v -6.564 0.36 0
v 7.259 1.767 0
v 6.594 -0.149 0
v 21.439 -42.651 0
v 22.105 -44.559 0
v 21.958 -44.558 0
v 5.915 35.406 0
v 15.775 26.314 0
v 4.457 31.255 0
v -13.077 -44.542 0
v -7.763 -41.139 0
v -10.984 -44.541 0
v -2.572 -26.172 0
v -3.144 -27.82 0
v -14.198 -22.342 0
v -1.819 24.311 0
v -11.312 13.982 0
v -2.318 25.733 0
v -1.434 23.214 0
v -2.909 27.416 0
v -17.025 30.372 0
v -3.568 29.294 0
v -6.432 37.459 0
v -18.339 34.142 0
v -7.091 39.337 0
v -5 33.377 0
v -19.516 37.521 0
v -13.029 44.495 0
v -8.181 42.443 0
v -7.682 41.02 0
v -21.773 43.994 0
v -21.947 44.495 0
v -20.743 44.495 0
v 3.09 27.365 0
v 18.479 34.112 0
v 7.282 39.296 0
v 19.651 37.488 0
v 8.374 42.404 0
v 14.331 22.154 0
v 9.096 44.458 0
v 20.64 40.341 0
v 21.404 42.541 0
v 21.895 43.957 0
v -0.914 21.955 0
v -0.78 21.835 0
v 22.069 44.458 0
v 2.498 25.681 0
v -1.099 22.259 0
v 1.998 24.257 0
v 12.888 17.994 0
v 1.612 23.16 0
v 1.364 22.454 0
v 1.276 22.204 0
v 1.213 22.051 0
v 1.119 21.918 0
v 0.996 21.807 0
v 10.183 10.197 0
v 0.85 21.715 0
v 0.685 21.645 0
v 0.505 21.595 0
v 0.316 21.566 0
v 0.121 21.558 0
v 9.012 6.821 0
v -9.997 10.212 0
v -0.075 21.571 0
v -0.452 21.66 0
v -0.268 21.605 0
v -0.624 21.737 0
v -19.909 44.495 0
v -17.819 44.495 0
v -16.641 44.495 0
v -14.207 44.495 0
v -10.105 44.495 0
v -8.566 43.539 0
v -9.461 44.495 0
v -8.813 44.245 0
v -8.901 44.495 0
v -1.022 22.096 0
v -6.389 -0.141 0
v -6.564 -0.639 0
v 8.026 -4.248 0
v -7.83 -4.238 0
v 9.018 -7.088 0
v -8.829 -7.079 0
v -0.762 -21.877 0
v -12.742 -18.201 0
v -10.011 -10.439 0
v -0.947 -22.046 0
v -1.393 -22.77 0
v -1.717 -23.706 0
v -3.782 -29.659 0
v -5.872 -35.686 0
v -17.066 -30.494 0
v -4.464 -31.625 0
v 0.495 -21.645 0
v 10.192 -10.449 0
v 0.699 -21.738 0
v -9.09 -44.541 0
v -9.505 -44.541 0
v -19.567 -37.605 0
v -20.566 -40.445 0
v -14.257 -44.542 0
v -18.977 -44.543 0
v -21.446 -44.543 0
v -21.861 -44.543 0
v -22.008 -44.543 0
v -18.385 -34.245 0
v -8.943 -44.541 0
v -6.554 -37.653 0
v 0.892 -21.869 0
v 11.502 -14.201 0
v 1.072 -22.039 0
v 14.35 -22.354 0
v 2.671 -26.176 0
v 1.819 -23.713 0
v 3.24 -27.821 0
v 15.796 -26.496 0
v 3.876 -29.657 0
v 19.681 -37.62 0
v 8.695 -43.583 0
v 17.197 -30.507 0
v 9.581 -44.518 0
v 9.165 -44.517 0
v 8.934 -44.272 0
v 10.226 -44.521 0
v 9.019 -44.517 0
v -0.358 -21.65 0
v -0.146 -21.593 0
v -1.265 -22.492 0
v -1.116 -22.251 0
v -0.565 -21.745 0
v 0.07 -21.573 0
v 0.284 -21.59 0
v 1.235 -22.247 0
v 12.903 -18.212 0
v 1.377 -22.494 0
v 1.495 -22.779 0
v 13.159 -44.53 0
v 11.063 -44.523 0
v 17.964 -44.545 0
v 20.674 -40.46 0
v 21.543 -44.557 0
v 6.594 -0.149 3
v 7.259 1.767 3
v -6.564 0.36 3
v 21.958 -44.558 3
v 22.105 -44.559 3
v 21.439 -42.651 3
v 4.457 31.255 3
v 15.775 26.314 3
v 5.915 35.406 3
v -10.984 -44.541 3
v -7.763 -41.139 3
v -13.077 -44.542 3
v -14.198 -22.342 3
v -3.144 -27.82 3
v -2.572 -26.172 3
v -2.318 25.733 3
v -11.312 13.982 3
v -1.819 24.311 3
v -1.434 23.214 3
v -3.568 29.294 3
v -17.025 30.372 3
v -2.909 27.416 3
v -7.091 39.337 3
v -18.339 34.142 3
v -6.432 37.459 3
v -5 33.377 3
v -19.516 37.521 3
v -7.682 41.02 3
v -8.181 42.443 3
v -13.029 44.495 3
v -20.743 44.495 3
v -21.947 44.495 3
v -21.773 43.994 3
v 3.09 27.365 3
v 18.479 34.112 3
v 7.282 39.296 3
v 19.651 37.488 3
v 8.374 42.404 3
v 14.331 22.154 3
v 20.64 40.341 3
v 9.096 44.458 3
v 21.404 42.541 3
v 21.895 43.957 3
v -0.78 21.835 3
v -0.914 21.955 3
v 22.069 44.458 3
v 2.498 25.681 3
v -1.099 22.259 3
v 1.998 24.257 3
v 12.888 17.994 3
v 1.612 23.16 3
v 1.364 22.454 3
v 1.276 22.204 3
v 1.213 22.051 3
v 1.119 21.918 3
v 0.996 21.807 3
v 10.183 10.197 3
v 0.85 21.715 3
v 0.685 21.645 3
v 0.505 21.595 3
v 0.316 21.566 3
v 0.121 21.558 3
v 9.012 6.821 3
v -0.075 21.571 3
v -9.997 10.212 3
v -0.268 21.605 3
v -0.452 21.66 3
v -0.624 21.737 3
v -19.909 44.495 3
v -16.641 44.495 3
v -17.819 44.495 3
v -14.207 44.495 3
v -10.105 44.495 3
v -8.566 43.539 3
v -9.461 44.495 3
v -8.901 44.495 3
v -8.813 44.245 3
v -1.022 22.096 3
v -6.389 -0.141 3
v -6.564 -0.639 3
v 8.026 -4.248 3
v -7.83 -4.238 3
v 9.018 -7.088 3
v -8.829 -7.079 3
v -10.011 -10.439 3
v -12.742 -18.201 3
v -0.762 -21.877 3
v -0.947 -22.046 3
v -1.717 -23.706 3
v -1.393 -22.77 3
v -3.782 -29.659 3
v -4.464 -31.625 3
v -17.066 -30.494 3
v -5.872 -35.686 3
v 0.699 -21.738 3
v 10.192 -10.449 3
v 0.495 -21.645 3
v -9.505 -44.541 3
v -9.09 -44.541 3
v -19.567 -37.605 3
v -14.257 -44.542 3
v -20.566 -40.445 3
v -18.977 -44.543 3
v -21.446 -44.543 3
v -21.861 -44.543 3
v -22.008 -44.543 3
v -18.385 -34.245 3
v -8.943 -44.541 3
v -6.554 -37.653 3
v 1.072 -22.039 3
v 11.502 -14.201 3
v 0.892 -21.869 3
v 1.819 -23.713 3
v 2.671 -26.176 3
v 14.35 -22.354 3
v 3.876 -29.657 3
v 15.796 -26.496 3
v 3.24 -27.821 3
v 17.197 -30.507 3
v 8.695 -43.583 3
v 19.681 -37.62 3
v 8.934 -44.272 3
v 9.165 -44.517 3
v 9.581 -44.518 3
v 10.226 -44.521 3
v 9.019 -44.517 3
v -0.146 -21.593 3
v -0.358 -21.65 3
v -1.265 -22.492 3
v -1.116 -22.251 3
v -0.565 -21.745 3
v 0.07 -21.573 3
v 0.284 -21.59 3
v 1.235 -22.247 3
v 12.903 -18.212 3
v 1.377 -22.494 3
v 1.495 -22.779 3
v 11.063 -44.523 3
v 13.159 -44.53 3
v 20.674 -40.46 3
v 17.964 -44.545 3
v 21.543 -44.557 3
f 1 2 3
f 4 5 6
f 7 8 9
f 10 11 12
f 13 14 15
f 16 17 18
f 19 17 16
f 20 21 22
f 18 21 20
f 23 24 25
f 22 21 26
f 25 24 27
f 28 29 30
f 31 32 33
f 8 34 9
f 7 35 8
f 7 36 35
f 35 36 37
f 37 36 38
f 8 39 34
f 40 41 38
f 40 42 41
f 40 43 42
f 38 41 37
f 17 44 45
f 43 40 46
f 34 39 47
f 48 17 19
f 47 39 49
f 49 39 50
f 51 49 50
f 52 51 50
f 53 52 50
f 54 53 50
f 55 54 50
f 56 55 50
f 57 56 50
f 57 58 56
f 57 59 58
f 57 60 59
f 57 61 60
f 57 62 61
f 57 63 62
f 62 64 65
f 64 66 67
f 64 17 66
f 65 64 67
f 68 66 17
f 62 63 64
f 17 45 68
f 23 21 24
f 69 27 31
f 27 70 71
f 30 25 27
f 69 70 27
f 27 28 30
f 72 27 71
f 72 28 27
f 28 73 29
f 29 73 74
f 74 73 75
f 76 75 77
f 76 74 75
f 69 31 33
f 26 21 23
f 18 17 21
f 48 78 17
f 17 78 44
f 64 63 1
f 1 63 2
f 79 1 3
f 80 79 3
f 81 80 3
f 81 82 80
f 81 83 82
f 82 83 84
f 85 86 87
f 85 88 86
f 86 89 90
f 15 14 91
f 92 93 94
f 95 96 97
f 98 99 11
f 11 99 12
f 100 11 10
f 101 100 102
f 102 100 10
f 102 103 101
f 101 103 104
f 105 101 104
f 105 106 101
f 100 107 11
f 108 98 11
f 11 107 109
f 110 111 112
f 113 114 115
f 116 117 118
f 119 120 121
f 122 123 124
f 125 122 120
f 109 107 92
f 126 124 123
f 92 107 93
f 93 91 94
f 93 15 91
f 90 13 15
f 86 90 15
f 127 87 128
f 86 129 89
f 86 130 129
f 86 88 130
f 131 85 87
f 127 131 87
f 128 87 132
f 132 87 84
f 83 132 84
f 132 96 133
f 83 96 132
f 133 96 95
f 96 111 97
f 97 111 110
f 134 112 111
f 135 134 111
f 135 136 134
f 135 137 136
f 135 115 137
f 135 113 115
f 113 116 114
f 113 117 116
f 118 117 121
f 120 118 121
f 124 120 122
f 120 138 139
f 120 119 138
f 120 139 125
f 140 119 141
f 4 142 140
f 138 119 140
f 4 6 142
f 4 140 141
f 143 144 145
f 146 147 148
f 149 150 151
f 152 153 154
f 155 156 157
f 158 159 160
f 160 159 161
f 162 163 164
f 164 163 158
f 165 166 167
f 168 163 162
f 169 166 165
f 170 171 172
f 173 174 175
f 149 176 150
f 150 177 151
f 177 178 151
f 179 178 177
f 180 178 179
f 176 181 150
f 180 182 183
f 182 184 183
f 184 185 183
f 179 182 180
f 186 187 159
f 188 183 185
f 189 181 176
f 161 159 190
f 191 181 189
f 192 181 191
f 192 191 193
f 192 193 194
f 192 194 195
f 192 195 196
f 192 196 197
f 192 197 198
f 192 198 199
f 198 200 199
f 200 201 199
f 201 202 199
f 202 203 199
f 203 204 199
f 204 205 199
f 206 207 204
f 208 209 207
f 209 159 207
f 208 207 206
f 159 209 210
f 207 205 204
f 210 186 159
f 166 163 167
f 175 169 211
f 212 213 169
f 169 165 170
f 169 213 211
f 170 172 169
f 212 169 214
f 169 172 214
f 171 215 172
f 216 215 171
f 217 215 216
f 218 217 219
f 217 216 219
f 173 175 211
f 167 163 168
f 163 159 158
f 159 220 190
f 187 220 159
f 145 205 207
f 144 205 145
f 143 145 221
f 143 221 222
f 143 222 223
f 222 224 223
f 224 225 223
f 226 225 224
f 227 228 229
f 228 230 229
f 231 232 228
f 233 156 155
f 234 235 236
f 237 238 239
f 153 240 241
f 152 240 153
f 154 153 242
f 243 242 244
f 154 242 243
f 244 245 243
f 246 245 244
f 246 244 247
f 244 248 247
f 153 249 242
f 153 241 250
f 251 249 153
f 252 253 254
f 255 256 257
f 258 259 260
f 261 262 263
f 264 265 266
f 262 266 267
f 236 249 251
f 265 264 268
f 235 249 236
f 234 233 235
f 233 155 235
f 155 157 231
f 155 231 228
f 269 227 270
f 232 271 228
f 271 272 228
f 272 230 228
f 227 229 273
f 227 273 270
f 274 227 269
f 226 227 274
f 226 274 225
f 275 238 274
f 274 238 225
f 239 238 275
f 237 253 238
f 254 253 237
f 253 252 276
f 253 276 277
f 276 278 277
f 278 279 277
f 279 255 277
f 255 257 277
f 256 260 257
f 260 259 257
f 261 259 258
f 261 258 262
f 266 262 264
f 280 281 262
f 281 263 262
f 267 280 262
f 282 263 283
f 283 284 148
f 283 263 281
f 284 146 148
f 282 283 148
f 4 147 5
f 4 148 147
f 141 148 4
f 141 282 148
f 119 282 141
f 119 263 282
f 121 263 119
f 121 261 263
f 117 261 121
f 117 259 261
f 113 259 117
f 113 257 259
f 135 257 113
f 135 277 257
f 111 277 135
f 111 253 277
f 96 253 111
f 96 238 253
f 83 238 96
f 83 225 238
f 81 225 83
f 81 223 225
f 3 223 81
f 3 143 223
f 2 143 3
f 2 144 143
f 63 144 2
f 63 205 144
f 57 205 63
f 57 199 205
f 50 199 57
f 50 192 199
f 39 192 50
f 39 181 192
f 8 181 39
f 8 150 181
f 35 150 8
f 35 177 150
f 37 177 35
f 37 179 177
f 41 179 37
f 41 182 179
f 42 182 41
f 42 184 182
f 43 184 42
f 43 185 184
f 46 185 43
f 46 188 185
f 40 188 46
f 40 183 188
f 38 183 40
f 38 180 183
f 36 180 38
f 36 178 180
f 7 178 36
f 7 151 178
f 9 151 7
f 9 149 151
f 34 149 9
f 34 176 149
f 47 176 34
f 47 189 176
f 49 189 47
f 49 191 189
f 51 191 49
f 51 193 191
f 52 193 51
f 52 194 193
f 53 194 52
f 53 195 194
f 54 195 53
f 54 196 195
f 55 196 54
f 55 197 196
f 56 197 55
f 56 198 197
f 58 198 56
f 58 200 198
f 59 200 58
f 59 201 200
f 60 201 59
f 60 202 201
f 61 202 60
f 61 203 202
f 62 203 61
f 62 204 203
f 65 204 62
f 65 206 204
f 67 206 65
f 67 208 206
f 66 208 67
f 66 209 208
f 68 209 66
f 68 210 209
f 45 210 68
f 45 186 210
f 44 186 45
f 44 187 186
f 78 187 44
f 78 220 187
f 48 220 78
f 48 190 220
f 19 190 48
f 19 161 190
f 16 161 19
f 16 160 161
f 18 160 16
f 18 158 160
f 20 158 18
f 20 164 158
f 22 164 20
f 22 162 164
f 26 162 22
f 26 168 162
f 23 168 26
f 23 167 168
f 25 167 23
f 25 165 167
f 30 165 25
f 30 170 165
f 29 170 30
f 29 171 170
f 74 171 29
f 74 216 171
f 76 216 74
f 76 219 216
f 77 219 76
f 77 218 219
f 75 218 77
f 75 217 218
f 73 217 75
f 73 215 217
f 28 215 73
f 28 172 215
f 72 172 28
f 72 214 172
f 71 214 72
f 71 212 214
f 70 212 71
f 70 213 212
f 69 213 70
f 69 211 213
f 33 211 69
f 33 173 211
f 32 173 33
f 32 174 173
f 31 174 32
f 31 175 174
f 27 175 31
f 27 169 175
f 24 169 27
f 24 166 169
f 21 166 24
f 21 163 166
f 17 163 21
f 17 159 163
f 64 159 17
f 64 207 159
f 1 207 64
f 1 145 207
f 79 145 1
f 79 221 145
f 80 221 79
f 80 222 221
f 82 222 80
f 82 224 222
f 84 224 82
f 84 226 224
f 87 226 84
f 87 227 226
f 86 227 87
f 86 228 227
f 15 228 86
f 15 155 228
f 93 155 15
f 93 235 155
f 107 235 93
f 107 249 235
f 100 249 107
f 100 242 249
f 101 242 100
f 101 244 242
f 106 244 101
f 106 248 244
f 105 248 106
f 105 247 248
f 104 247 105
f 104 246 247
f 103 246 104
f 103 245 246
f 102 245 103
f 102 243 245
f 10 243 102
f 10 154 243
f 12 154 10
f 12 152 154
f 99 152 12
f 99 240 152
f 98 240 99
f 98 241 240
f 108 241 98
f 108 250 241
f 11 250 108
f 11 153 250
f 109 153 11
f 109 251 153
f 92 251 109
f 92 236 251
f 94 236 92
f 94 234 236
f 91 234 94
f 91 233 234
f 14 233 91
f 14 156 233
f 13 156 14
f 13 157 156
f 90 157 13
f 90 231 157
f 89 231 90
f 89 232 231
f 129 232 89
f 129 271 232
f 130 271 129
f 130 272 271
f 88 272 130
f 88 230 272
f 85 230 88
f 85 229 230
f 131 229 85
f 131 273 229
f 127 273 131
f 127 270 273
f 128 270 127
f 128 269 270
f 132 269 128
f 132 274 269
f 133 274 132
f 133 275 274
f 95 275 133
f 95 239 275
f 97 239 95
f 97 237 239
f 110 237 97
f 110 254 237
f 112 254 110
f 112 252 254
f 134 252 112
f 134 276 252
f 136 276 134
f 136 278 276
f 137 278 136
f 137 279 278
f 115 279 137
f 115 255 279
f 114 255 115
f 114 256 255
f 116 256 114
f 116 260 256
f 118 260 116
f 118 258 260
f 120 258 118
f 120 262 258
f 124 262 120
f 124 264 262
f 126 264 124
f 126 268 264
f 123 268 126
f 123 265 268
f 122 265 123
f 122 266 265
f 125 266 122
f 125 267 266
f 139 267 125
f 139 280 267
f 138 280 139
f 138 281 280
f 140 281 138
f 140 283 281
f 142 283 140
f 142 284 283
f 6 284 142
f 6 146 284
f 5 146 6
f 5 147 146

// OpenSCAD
// Generated from 交通部公路局（原交通部公路總局）「新式號牌使用之英文字、數字字體」author trace
fudge = 0.1;

module glyph_2012_X(h = 3) {
  difference() {
    linear_extrude(height = h)
      polygon(points = [[-21.9474, 44.495], [-21.7727, 43.9937], [-21.2789, 42.577], [-20.5116, 40.3758], [-19.5164, 37.5207], [-18.3389, 34.1425], [-17.0246, 30.372], [-15.6192, 26.3399], [-14.1682, 22.1771], [-12.7172, 18.0143], [-11.3118, 13.9823], [-9.9975, 10.2118], [-8.82, 6.8336], [-7.8248, 3.9785], [-7.0575, 1.7772], [-6.5637, 0.3605], [-6.3889, -0.1408], [-6.5644, -0.6394], [-7.0601, -2.0487], [-7.8303, -4.2384], [-8.8294, -7.0786], [-10.0114, -10.4392], [-11.3308, -14.19], [-12.7417, -18.2009], [-14.1983, -22.342], [-15.6549, -26.483], [-17.0658, -30.494], [-18.3851, -34.2448], [-19.5672, -37.6053], [-20.5662, -40.4455], [-21.3365, -42.6353], [-21.8322, -44.0446], [-22.0076, -44.5432], [-21.8609, -44.5432], [-21.4462, -44.5431], [-20.802, -44.543], [-19.9663, -44.5429], [-18.9775, -44.5428], [-17.874, -44.5426], [-16.6938, -44.5424], [-15.4754, -44.5422], [-14.257, -44.542], [-13.0769, -44.5419], [-11.9733, -44.5417], [-10.9845, -44.5415], [-10.1489, -44.5414], [-9.5046, -44.5413], [-9.0899, -44.5413], [-8.9432, -44.5412], [-8.8584, -44.2967], [-8.6188, -43.6058], [-8.2464, -42.5321], [-7.7634, -41.1395], [-7.192, -39.4918], [-6.5542, -37.6527], [-5.8721, -35.6861], [-5.1679, -33.6557], [-4.4637, -31.6253], [-3.7817, -29.6587], [-3.1438, -27.8196], [-2.5724, -26.1719], [-2.0894, -24.7793], [-1.717, -23.7057], [-1.4774, -23.0147], [-1.3926, -22.7702], [-1.2655, -22.4924], [-1.1159, -22.2508], [-0.9471, -22.0456], [-0.7623, -21.877], [-0.565, -21.7453], [-0.3584, -21.6505], [-0.1457, -21.5929], [0.0697, -21.5726], [0.2845, -21.59], [0.4954, -21.6451], [0.6992, -21.7381], [0.8925, -21.8693], [1.0721, -22.0388], [1.2346, -22.2468], [1.3768, -22.4936], [1.4953, -22.7792], [1.5798, -23.0233], [1.8186, -23.7132], [2.1896, -24.7852], [2.6708, -26.1757], [3.2402, -27.8208], [3.8757, -29.6571], [4.5553, -31.6207], [5.2569, -33.6479], [5.9586, -35.6752], [6.6382, -37.6388], [7.2737, -39.475], [7.8431, -41.1202], [8.3243, -42.5106], [8.6953, -43.5826], [8.9341, -44.2725], [9.0186, -44.5167], [9.1655, -44.5171], [9.5809, -44.5185], [10.2263, -44.5206], [11.0633, -44.5232], [12.0538, -44.5264], [13.1592, -44.53], [14.3414, -44.5338], [15.5618, -44.5377], [16.7823, -44.5416], [17.9644, -44.5454], [19.0699, -44.549], [20.0603, -44.5522], [20.8974, -44.5549], [21.5428, -44.557], [21.9581, -44.5583], [22.1051, -44.5588], [21.9309, -44.06], [21.4386, -42.6506], [20.6737, -40.4604], [19.6815, -37.6198], [18.5076, -34.2587], [17.1974, -30.5073], [15.7962, -26.4957], [14.3497, -22.354], [12.9031, -18.2123], [11.502, -14.2007], [10.1917, -10.4494], [9.0178, -7.0883], [8.0257, -4.2476], [7.2607, -2.0575], [6.7684, -0.648], [6.5942, -0.1493], [6.768, 0.3517], [7.2592, 1.7674], [8.0223, 3.9673], [9.0121, 6.8206], [10.1833, 10.1966], [11.4904, 13.9647], [12.8882, 17.9942], [14.3314, 22.1544], [15.7746, 26.3145], [17.1724, 30.344], [18.4795, 34.1121], [19.6507, 37.4881], [20.6405, 40.3414], [21.4037, 42.5413], [21.8948, 43.9571], [22.0686, 44.458], [21.9229, 44.458], [21.5112, 44.458], [20.8714, 44.458], [20.0416, 44.458], [19.0598, 44.458], [17.964, 44.458], [16.7922, 44.458], [15.5823, 44.458], [14.3725, 44.458], [13.2007, 44.458], [12.1048, 44.458], [11.123, 44.458], [10.2932, 44.458], [9.6535, 44.458], [9.2418, 44.458], [9.0961, 44.458], [9.0083, 44.2081], [8.7601, 43.5018], [8.3744, 42.4043], [7.8742, 40.9808], [7.2824, 39.2965], [6.6218, 37.4166], [5.9154, 35.4064], [5.1861, 33.3309], [4.4568, 31.2554], [3.7504, 29.2452], [3.0898, 27.3653], [2.4979, 25.681], [1.9977, 24.2575], [1.6121, 23.16], [1.3639, 22.4537], [1.276, 22.2038], [1.2135, 22.051], [1.1186, 21.9185], [0.9959, 21.8066], [0.8497, 21.7153], [0.6846, 21.6447], [0.5051, 21.5949], [0.3156, 21.5659], [0.1207, 21.5579], [-0.0753, 21.5709], [-0.2678, 21.6051], [-0.4524, 21.6604], [-0.6245, 21.7371], [-0.7797, 21.8352], [-0.9136, 21.9547], [-1.0216, 22.0958], [-1.0992, 22.2586], [-1.1868, 22.5083], [-1.4344, 23.2141], [-1.8192, 24.3107], [-2.3182, 25.733], [-2.9087, 27.4159], [-3.5677, 29.2942], [-4.2725, 31.3029], [-5.0001, 33.3766], [-5.7277, 35.4504], [-6.4324, 37.459], [-7.0915, 39.3373], [-7.6819, 41.0203], [-8.181, 42.4426], [-8.5657, 43.5392], [-8.8133, 44.2449], [-8.901, 44.4946], [-9.0475, 44.4946], [-9.4615, 44.4946], [-10.105, 44.4947], [-10.9395, 44.4947], [-11.9269, 44.4947], [-13.0289, 44.4947], [-14.2075, 44.4948], [-15.4242, 44.4948], [-16.6409, 44.4948], [-17.8195, 44.4949], [-18.9215, 44.4949], [-19.9089, 44.4949], [-20.7434, 44.495], [-21.3869, 44.495], [-21.8009, 44.495]]);
  }
}

glyph_2012_X();
